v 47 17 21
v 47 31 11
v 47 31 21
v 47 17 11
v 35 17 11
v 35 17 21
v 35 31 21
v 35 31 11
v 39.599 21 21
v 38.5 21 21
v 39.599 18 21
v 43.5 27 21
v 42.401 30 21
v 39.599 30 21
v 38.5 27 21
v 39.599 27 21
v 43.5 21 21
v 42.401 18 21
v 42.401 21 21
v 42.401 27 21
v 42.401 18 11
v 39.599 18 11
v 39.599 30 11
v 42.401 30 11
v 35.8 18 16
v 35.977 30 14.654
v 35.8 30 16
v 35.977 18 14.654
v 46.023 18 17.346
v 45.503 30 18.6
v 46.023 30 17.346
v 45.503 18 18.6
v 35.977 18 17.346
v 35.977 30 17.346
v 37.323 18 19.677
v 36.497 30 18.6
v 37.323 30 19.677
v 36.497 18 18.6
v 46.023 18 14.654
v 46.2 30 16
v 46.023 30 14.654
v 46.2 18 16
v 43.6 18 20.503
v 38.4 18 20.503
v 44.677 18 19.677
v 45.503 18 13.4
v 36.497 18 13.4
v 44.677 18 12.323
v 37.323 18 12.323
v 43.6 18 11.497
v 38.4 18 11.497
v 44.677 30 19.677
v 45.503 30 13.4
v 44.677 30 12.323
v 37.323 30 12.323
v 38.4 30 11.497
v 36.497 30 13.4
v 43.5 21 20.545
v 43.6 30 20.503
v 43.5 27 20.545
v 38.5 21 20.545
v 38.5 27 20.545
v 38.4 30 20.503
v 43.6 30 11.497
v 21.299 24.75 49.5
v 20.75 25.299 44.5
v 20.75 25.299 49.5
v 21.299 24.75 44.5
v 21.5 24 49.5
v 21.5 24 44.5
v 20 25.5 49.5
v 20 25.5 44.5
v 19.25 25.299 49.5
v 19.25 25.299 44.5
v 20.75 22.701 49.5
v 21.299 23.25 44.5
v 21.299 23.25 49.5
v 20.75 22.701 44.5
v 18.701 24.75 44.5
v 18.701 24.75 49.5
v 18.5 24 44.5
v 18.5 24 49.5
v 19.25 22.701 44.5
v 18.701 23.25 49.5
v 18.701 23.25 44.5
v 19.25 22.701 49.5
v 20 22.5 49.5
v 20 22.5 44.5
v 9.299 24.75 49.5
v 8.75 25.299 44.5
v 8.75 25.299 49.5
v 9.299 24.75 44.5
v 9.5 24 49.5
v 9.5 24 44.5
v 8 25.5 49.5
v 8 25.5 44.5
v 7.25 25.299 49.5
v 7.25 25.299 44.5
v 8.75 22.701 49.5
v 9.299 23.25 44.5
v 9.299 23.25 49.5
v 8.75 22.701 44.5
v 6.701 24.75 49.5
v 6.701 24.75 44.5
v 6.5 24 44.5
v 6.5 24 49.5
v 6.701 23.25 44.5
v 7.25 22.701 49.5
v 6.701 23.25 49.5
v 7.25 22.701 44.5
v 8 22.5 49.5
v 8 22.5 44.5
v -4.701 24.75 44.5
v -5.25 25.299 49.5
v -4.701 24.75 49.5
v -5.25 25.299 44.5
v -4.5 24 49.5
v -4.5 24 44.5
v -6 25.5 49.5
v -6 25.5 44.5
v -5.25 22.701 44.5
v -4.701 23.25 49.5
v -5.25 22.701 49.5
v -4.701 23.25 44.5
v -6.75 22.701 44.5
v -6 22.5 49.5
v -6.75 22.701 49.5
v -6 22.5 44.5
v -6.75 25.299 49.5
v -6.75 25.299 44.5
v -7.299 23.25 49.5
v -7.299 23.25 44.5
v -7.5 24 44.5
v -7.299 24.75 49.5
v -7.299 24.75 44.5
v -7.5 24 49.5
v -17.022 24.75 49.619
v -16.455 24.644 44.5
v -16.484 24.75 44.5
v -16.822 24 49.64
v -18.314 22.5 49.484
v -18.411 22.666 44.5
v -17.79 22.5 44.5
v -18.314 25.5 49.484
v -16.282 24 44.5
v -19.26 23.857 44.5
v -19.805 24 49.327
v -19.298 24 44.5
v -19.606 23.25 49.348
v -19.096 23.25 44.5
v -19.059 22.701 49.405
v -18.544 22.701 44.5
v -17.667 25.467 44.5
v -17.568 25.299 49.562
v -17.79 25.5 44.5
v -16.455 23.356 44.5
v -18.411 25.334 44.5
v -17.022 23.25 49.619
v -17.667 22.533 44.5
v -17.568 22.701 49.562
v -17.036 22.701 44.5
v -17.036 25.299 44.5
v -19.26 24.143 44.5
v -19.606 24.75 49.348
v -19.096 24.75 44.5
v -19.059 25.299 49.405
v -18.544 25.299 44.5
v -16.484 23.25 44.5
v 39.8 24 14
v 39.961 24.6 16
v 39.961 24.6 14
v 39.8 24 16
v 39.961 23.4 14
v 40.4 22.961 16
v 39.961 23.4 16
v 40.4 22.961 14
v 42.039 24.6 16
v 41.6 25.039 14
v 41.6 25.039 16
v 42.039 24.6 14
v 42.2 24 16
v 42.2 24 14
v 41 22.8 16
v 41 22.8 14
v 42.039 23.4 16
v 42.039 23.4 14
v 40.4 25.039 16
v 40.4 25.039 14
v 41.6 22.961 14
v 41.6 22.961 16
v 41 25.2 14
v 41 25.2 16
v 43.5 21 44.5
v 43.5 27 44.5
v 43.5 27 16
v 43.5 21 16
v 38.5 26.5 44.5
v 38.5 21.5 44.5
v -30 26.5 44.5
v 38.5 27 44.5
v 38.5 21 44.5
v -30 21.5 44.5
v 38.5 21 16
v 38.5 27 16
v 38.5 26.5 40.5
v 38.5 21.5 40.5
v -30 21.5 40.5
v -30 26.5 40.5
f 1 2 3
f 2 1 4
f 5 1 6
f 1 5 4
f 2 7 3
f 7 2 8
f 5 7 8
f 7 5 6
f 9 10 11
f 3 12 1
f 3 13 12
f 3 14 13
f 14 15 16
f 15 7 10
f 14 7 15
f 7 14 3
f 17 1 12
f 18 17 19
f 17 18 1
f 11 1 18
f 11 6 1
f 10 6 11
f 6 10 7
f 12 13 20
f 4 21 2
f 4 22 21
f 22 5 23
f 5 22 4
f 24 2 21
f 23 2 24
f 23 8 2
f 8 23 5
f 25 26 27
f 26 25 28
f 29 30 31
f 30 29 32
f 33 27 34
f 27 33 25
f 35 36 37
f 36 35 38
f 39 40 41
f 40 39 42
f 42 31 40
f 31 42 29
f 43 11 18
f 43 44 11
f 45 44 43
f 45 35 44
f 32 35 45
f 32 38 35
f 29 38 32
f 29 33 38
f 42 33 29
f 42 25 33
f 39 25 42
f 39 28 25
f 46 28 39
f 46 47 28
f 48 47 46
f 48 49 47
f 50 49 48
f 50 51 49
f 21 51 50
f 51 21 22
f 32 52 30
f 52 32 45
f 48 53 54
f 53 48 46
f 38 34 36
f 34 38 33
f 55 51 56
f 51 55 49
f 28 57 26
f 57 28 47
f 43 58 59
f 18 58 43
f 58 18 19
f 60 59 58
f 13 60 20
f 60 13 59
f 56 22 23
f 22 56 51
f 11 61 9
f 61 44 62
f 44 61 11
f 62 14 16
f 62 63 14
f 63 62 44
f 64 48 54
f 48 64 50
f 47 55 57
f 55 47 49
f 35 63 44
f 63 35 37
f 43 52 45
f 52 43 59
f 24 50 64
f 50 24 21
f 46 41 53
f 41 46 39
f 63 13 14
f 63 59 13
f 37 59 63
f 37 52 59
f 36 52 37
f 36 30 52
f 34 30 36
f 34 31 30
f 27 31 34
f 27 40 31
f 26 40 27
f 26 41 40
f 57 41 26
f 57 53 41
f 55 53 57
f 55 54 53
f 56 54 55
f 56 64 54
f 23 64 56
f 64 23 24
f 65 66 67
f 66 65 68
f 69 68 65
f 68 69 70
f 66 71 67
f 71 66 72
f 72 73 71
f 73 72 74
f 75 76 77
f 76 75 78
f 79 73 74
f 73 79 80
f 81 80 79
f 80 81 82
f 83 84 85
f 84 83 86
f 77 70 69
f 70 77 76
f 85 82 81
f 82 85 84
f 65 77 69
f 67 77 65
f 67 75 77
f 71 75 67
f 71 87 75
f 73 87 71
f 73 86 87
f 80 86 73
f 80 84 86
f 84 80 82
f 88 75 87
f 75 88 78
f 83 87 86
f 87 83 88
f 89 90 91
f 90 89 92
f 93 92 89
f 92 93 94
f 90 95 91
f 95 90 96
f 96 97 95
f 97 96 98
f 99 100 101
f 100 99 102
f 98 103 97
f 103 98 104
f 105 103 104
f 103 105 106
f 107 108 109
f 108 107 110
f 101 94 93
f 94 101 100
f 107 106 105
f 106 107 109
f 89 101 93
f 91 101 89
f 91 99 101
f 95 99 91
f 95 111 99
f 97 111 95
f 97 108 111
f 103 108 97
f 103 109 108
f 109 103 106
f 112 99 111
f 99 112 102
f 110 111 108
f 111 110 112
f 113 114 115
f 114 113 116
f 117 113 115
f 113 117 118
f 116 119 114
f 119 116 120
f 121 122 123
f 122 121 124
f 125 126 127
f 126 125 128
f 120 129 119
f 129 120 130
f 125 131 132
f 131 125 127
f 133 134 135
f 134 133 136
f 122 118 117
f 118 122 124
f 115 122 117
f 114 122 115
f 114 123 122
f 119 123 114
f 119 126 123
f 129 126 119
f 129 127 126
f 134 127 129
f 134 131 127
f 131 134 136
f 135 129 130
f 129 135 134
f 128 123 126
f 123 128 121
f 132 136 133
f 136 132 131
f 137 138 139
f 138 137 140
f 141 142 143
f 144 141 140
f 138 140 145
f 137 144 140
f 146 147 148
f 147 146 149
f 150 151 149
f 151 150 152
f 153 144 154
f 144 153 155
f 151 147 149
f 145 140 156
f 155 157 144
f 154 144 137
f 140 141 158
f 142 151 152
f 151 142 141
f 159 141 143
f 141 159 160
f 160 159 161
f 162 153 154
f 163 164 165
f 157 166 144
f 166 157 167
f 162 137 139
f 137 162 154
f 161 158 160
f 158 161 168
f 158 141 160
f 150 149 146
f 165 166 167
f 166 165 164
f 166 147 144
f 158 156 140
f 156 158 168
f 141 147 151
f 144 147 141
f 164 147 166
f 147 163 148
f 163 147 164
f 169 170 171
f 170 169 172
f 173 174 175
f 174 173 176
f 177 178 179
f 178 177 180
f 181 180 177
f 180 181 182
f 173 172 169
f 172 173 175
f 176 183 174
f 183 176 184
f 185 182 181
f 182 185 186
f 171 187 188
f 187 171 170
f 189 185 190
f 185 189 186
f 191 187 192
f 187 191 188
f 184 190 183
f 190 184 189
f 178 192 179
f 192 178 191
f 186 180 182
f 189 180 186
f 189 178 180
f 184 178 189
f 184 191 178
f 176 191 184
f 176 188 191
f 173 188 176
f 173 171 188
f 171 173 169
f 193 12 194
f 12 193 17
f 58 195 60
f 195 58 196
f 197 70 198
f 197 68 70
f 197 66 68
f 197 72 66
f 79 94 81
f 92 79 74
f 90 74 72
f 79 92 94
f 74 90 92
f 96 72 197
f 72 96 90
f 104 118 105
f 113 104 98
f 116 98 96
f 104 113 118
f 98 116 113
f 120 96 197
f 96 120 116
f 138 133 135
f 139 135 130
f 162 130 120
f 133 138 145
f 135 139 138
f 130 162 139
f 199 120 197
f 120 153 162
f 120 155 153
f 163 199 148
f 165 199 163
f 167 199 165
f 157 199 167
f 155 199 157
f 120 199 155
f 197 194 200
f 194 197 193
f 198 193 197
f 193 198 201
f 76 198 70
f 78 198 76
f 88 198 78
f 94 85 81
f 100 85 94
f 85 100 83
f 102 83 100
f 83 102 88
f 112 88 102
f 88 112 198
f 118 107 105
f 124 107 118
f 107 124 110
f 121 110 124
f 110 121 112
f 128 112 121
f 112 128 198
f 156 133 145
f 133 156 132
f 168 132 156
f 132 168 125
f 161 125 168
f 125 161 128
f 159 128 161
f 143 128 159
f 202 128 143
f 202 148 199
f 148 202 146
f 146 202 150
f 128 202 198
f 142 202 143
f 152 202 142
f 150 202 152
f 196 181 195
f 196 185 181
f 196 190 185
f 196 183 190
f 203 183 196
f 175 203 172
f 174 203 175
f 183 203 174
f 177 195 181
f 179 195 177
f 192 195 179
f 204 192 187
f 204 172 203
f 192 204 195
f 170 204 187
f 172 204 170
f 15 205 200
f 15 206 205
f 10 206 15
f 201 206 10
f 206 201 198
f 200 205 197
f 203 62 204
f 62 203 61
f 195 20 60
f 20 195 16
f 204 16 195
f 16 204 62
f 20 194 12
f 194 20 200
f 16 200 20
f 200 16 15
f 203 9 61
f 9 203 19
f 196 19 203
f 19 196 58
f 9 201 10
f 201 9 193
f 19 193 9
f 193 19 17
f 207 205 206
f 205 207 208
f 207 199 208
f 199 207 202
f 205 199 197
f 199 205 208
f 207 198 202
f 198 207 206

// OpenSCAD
// file: utils.scad
include <parameters.scad>

module beamBetween(p1, p2, width, height) {
    dx = p2[0] - p1[0];
    dz = p2[2] - p1[2];
    length = sqrt(dx * dx + dz * dz);
    angle = atan2(dz, dx);

    translate([(p1[0] + p2[0]) / 2, (p1[1] + p2[1]) / 2, (p1[2] + p2[2]) / 2])
        rotate([0, -angle, 0])
            cube([length, width, height], center = true);
}
// file: seat.scad
include <parameters.scad>
use <utils.scad>

//================ SEAT SUPPORT FRAME (L-BRACKETS) =================//
// Two L-brackets carry the seat. Each one sits on the cross-bar that
// joins the two back drive sprockets. Aluminum construction.
// Suspension beams mount to the outboard side of each bracket riser.

module seatBracket(y, w = 6) {
    panB = idlerZ + seatTopOffset - 5;   // pan bottom
    barX = idlerX;                        // the drive cross-track bar (back sprockets)
    barZ = idlerZ;                        // bar height = sprocket axle height

    // Foot that clamps around the cross-track bar (wraps the axle).
    // Pinch bolt secures the clamp.
    color(matDarkSteel)
        translate([barX, y, barZ])
            rotate([90, 0, 0])
                difference() {
                    cube([12, 10, 14], center = true);
                    cylinder(r = 5.2, h = w + 6, center = true, $fn = 24);
                }
    // Pinch bolt through clamp
    color(matChrome)
        translate([barX, y, barZ + 6])
            cylinder(r = 1.2, h = 16, center = true, $fn = 12);

    // Vertical riser — up from the bar to the pan bottom. Aluminum.
    color(matAluminum)
        translate([barX, y, (barZ + panB) / 2])
            cube([5, w, panB - barZ], center = true);

    // Horizontal arm: out from the riser, under the pan, to the seat.
    armX2 = -30;
    color(matAluminum)
        translate([(barX + armX2) / 2, y, panB - 2])
            cube([barX - armX2, w - 1, 4], center = true);

    // Bolts up into the pan along the horizontal arm.
    for (bx = [20, 8, -6, -18])
        color(matChrome)
            translate([bx, y, panB + 2])
                rotate([0, bx == -18 ? -6 : 0, 0])
                    cylinder(r = 1.5, h = 6, center = true, $fn = 12);
}

//================ BUCKET SEAT =================//
// Aluminum seat with leather cushion:
//  - flat aluminium pan (3mm thick)
//  - leather cushion pad on top
//  - slim aluminium backrest panel with leather pad
//  - aluminium headrest

module roundedRectPlate(w, d, h, r, $fn = 32) {
    hull()
        for (sx = [-1, 1])
            for (sy = [-1, 1])
                translate([sx * (w / 2 - r), sy * (d / 2 - r), 0])
                    cylinder(r = r, h = h, center = true);
}

module bucketSeat() {
    topZ = idlerZ + seatTopOffset;
    backX = idlerX - 14;
    panCX = backX - seatPanLength / 2;
    L = seatPanLength;
    W = seatPanWidth;
    panH = 3;                            // aluminum pan (3mm thick)
    padH = 5;                            // leather cushion thickness
    corner = 9;

    // ---- Seat pan (aluminium plate, rounded corners). ----
    color(matAluminum)
        translate([panCX, 0, topZ - panH / 2])
            roundedRectPlate(L, W, panH, corner);

    // ---- Leather cushion pad (inset seating surface). ----
    color(matLeather)
        translate([panCX - 1, 0, topZ - padH / 2 - 0.5])
            roundedRectPlate(L - 10, W - 8, padH, corner - 2);

    // ---- Backrest panel: aluminium with leather pad. ----
    tilt = seatBackRecline;
    bw = W - 10;
    thick = 3;                          // aluminum (3mm thick)
    bh = backShellHeight;
    translate([backX, 0, topZ])
        rotate([0, tilt, 0]) {
            // main aluminium panel
            color(matAluminum)
                translate([-1, 0, bh / 2])
                    roundedRectPlate(thick, bw, bh, 2);

            // leather lumbar pad (lower back)
            color(matLeather)
                translate([-4.5, 0, 26])
                    roundedRectPlate(7, bw * 0.42, 16, 3);

            // headrest (aluminium)
            color(matAluminum)
                translate([-1, 0, bh + headrestHeight / 2 - 4])
                    roundedRectPlate(thick + 4, bw * 0.5, headrestHeight, 4);
        }
}
// file: parameters.scad
// Shared parameters for tracked wheelchair prototype
// NOTE: 1 unit = 1 cm (seat target 450 mm = 45 units above ground).
$fn = 48;

//================ MATERIALS =================//
// Frame: aluminum 6061-T6 (lightweight)
// Seat: carbon fiber T700 + honeycomb (ultralight)
// Suspension: rubber bushings (lightweight)
// Axles: aluminum 7075-T6 (1/3 weight of steel)
matSteel      = [0.35, 0.36, 0.38];   // hardware / fasteners only
matDarkSteel  = [0.25, 0.26, 0.28];
matRubber     = [0.12, 0.12, 0.14];   // track belt + bushings
matAluminum   = [0.55, 0.57, 0.60];   // primary frame material
matChrome     = [0.70, 0.72, 0.75];
matCarbon     = [0.15, 0.15, 0.18];   // (unused — seat now aluminum)
matLeather    = [0.45, 0.25, 0.12];   // leather cushion color

//================ TRACKS =================//
trackLength = 82;
trackWidth = 14;
trackCenterY = 28;

idlerRadius = 10;
idlerX = trackLength / 2;
idlerZ = 16;
roadRadius = 7;
roadZ = 13;  // road wheels roll on the belt's inner surface (belt upper edge at this height)
roadPositions = [-22, -6, 10, 24];

linkLength = 10;
linkWidth = trackWidth + 2;
linkThickness = 3;
linkGap = 1;
// Belt centerline clears the idler wheels plus link half-thickness,
// so the links ride on the wheels instead of clipping through them.
trackRadius = idlerRadius + linkThickness / 2;  // = 11.5
beltThickness = 3;
groundZ = idlerZ - trackRadius;  // bottom of track = ground level (4.5)

//================ HYDRAULIC JACK WHEEL =================//
trackTilt = 0;
liftPivotX = idlerX;
liftPivotZ = idlerZ;
// Electric linear actuator (24V DC, 500kg, 300mm stroke).
// 1/3 weight of hydraulic system.
hydrWheelRadius = 4;
hydrWheelWidth = 10;
hydrBarrelRadius = 4;        // smaller barrel (mini actuator)
hydrBarrelHeight = 12;       // shorter barrel
hydrRodRadius = 2;
// At full extension the jack wheel rests on the ground:
// mountZ 35 - groundZ 4.5 - wheelR 4 = 26.5
hydrExtend = 26.5;
hydrRetracted = 0;
hydrExtendAmount = hydrExtend;
hydrMountX = 10;   // jack mount x; moved forward (from 24) for first-stair clearance
hydrMountY = 0;

//================ CHASSIS =================//
chassisLength = 82;
chassisBottom = 35;
chassisHeight = 12;

//================ SEAT =================//
// Seat geometry: flat aluminium pan + leather cushion + slim backrest.
// Seat surface rides at 450 mm (45 units) above the ground.
// topZ = idlerZ + seatTopOffset = 49.5, ground at 4.5 -> seat 45 above ground.
seatPanLength = 66;
seatPanWidth = 66;
backShellHeight = 72;
headrestHeight = 16;
seatTopOffset = 45 - trackRadius;  // = 33.5
// Backrest recline (deg from vertical).
seatBackRecline = 8;

//================ FOOTREST =================//
footrestWidth = 34;
footrestLength = 28;
footrestThickness = 3;       // 3mm aluminum plate
footrestHeight = idlerZ + 12;
footrestFrontX = -30 - footrestLength / 2;  // plate center, extends forward from arm end

// Folding footplate pivots at the end of the L-bracket arm.
footPivotX = -30;                           // end of L-bracket horizontal arm
footPivotZ = idlerZ + seatTopOffset - 7;    // arm height (panB - 2)
footHeelGuard = true;                       // optional heel guard
footToeGuard = false;                       // optional toe guard (off by default)

//================ ARMRESTS =================//
armPivotX = idlerX - 14;                     // rear post at the seat back
armLength = 68;                              // full-length pad (covers seat depth)
armPadHeight = idlerZ + seatTopOffset + 19;  // pad top = elbow height (~19 above seat top)
armPadWidth = 8;
armPadThick = 4;
// main file
// STL EXPORT: Seat L-bracket (single side)
include <parameters.scad>
use <seat.scad>
seatBracket(trackCenterY - 4);
